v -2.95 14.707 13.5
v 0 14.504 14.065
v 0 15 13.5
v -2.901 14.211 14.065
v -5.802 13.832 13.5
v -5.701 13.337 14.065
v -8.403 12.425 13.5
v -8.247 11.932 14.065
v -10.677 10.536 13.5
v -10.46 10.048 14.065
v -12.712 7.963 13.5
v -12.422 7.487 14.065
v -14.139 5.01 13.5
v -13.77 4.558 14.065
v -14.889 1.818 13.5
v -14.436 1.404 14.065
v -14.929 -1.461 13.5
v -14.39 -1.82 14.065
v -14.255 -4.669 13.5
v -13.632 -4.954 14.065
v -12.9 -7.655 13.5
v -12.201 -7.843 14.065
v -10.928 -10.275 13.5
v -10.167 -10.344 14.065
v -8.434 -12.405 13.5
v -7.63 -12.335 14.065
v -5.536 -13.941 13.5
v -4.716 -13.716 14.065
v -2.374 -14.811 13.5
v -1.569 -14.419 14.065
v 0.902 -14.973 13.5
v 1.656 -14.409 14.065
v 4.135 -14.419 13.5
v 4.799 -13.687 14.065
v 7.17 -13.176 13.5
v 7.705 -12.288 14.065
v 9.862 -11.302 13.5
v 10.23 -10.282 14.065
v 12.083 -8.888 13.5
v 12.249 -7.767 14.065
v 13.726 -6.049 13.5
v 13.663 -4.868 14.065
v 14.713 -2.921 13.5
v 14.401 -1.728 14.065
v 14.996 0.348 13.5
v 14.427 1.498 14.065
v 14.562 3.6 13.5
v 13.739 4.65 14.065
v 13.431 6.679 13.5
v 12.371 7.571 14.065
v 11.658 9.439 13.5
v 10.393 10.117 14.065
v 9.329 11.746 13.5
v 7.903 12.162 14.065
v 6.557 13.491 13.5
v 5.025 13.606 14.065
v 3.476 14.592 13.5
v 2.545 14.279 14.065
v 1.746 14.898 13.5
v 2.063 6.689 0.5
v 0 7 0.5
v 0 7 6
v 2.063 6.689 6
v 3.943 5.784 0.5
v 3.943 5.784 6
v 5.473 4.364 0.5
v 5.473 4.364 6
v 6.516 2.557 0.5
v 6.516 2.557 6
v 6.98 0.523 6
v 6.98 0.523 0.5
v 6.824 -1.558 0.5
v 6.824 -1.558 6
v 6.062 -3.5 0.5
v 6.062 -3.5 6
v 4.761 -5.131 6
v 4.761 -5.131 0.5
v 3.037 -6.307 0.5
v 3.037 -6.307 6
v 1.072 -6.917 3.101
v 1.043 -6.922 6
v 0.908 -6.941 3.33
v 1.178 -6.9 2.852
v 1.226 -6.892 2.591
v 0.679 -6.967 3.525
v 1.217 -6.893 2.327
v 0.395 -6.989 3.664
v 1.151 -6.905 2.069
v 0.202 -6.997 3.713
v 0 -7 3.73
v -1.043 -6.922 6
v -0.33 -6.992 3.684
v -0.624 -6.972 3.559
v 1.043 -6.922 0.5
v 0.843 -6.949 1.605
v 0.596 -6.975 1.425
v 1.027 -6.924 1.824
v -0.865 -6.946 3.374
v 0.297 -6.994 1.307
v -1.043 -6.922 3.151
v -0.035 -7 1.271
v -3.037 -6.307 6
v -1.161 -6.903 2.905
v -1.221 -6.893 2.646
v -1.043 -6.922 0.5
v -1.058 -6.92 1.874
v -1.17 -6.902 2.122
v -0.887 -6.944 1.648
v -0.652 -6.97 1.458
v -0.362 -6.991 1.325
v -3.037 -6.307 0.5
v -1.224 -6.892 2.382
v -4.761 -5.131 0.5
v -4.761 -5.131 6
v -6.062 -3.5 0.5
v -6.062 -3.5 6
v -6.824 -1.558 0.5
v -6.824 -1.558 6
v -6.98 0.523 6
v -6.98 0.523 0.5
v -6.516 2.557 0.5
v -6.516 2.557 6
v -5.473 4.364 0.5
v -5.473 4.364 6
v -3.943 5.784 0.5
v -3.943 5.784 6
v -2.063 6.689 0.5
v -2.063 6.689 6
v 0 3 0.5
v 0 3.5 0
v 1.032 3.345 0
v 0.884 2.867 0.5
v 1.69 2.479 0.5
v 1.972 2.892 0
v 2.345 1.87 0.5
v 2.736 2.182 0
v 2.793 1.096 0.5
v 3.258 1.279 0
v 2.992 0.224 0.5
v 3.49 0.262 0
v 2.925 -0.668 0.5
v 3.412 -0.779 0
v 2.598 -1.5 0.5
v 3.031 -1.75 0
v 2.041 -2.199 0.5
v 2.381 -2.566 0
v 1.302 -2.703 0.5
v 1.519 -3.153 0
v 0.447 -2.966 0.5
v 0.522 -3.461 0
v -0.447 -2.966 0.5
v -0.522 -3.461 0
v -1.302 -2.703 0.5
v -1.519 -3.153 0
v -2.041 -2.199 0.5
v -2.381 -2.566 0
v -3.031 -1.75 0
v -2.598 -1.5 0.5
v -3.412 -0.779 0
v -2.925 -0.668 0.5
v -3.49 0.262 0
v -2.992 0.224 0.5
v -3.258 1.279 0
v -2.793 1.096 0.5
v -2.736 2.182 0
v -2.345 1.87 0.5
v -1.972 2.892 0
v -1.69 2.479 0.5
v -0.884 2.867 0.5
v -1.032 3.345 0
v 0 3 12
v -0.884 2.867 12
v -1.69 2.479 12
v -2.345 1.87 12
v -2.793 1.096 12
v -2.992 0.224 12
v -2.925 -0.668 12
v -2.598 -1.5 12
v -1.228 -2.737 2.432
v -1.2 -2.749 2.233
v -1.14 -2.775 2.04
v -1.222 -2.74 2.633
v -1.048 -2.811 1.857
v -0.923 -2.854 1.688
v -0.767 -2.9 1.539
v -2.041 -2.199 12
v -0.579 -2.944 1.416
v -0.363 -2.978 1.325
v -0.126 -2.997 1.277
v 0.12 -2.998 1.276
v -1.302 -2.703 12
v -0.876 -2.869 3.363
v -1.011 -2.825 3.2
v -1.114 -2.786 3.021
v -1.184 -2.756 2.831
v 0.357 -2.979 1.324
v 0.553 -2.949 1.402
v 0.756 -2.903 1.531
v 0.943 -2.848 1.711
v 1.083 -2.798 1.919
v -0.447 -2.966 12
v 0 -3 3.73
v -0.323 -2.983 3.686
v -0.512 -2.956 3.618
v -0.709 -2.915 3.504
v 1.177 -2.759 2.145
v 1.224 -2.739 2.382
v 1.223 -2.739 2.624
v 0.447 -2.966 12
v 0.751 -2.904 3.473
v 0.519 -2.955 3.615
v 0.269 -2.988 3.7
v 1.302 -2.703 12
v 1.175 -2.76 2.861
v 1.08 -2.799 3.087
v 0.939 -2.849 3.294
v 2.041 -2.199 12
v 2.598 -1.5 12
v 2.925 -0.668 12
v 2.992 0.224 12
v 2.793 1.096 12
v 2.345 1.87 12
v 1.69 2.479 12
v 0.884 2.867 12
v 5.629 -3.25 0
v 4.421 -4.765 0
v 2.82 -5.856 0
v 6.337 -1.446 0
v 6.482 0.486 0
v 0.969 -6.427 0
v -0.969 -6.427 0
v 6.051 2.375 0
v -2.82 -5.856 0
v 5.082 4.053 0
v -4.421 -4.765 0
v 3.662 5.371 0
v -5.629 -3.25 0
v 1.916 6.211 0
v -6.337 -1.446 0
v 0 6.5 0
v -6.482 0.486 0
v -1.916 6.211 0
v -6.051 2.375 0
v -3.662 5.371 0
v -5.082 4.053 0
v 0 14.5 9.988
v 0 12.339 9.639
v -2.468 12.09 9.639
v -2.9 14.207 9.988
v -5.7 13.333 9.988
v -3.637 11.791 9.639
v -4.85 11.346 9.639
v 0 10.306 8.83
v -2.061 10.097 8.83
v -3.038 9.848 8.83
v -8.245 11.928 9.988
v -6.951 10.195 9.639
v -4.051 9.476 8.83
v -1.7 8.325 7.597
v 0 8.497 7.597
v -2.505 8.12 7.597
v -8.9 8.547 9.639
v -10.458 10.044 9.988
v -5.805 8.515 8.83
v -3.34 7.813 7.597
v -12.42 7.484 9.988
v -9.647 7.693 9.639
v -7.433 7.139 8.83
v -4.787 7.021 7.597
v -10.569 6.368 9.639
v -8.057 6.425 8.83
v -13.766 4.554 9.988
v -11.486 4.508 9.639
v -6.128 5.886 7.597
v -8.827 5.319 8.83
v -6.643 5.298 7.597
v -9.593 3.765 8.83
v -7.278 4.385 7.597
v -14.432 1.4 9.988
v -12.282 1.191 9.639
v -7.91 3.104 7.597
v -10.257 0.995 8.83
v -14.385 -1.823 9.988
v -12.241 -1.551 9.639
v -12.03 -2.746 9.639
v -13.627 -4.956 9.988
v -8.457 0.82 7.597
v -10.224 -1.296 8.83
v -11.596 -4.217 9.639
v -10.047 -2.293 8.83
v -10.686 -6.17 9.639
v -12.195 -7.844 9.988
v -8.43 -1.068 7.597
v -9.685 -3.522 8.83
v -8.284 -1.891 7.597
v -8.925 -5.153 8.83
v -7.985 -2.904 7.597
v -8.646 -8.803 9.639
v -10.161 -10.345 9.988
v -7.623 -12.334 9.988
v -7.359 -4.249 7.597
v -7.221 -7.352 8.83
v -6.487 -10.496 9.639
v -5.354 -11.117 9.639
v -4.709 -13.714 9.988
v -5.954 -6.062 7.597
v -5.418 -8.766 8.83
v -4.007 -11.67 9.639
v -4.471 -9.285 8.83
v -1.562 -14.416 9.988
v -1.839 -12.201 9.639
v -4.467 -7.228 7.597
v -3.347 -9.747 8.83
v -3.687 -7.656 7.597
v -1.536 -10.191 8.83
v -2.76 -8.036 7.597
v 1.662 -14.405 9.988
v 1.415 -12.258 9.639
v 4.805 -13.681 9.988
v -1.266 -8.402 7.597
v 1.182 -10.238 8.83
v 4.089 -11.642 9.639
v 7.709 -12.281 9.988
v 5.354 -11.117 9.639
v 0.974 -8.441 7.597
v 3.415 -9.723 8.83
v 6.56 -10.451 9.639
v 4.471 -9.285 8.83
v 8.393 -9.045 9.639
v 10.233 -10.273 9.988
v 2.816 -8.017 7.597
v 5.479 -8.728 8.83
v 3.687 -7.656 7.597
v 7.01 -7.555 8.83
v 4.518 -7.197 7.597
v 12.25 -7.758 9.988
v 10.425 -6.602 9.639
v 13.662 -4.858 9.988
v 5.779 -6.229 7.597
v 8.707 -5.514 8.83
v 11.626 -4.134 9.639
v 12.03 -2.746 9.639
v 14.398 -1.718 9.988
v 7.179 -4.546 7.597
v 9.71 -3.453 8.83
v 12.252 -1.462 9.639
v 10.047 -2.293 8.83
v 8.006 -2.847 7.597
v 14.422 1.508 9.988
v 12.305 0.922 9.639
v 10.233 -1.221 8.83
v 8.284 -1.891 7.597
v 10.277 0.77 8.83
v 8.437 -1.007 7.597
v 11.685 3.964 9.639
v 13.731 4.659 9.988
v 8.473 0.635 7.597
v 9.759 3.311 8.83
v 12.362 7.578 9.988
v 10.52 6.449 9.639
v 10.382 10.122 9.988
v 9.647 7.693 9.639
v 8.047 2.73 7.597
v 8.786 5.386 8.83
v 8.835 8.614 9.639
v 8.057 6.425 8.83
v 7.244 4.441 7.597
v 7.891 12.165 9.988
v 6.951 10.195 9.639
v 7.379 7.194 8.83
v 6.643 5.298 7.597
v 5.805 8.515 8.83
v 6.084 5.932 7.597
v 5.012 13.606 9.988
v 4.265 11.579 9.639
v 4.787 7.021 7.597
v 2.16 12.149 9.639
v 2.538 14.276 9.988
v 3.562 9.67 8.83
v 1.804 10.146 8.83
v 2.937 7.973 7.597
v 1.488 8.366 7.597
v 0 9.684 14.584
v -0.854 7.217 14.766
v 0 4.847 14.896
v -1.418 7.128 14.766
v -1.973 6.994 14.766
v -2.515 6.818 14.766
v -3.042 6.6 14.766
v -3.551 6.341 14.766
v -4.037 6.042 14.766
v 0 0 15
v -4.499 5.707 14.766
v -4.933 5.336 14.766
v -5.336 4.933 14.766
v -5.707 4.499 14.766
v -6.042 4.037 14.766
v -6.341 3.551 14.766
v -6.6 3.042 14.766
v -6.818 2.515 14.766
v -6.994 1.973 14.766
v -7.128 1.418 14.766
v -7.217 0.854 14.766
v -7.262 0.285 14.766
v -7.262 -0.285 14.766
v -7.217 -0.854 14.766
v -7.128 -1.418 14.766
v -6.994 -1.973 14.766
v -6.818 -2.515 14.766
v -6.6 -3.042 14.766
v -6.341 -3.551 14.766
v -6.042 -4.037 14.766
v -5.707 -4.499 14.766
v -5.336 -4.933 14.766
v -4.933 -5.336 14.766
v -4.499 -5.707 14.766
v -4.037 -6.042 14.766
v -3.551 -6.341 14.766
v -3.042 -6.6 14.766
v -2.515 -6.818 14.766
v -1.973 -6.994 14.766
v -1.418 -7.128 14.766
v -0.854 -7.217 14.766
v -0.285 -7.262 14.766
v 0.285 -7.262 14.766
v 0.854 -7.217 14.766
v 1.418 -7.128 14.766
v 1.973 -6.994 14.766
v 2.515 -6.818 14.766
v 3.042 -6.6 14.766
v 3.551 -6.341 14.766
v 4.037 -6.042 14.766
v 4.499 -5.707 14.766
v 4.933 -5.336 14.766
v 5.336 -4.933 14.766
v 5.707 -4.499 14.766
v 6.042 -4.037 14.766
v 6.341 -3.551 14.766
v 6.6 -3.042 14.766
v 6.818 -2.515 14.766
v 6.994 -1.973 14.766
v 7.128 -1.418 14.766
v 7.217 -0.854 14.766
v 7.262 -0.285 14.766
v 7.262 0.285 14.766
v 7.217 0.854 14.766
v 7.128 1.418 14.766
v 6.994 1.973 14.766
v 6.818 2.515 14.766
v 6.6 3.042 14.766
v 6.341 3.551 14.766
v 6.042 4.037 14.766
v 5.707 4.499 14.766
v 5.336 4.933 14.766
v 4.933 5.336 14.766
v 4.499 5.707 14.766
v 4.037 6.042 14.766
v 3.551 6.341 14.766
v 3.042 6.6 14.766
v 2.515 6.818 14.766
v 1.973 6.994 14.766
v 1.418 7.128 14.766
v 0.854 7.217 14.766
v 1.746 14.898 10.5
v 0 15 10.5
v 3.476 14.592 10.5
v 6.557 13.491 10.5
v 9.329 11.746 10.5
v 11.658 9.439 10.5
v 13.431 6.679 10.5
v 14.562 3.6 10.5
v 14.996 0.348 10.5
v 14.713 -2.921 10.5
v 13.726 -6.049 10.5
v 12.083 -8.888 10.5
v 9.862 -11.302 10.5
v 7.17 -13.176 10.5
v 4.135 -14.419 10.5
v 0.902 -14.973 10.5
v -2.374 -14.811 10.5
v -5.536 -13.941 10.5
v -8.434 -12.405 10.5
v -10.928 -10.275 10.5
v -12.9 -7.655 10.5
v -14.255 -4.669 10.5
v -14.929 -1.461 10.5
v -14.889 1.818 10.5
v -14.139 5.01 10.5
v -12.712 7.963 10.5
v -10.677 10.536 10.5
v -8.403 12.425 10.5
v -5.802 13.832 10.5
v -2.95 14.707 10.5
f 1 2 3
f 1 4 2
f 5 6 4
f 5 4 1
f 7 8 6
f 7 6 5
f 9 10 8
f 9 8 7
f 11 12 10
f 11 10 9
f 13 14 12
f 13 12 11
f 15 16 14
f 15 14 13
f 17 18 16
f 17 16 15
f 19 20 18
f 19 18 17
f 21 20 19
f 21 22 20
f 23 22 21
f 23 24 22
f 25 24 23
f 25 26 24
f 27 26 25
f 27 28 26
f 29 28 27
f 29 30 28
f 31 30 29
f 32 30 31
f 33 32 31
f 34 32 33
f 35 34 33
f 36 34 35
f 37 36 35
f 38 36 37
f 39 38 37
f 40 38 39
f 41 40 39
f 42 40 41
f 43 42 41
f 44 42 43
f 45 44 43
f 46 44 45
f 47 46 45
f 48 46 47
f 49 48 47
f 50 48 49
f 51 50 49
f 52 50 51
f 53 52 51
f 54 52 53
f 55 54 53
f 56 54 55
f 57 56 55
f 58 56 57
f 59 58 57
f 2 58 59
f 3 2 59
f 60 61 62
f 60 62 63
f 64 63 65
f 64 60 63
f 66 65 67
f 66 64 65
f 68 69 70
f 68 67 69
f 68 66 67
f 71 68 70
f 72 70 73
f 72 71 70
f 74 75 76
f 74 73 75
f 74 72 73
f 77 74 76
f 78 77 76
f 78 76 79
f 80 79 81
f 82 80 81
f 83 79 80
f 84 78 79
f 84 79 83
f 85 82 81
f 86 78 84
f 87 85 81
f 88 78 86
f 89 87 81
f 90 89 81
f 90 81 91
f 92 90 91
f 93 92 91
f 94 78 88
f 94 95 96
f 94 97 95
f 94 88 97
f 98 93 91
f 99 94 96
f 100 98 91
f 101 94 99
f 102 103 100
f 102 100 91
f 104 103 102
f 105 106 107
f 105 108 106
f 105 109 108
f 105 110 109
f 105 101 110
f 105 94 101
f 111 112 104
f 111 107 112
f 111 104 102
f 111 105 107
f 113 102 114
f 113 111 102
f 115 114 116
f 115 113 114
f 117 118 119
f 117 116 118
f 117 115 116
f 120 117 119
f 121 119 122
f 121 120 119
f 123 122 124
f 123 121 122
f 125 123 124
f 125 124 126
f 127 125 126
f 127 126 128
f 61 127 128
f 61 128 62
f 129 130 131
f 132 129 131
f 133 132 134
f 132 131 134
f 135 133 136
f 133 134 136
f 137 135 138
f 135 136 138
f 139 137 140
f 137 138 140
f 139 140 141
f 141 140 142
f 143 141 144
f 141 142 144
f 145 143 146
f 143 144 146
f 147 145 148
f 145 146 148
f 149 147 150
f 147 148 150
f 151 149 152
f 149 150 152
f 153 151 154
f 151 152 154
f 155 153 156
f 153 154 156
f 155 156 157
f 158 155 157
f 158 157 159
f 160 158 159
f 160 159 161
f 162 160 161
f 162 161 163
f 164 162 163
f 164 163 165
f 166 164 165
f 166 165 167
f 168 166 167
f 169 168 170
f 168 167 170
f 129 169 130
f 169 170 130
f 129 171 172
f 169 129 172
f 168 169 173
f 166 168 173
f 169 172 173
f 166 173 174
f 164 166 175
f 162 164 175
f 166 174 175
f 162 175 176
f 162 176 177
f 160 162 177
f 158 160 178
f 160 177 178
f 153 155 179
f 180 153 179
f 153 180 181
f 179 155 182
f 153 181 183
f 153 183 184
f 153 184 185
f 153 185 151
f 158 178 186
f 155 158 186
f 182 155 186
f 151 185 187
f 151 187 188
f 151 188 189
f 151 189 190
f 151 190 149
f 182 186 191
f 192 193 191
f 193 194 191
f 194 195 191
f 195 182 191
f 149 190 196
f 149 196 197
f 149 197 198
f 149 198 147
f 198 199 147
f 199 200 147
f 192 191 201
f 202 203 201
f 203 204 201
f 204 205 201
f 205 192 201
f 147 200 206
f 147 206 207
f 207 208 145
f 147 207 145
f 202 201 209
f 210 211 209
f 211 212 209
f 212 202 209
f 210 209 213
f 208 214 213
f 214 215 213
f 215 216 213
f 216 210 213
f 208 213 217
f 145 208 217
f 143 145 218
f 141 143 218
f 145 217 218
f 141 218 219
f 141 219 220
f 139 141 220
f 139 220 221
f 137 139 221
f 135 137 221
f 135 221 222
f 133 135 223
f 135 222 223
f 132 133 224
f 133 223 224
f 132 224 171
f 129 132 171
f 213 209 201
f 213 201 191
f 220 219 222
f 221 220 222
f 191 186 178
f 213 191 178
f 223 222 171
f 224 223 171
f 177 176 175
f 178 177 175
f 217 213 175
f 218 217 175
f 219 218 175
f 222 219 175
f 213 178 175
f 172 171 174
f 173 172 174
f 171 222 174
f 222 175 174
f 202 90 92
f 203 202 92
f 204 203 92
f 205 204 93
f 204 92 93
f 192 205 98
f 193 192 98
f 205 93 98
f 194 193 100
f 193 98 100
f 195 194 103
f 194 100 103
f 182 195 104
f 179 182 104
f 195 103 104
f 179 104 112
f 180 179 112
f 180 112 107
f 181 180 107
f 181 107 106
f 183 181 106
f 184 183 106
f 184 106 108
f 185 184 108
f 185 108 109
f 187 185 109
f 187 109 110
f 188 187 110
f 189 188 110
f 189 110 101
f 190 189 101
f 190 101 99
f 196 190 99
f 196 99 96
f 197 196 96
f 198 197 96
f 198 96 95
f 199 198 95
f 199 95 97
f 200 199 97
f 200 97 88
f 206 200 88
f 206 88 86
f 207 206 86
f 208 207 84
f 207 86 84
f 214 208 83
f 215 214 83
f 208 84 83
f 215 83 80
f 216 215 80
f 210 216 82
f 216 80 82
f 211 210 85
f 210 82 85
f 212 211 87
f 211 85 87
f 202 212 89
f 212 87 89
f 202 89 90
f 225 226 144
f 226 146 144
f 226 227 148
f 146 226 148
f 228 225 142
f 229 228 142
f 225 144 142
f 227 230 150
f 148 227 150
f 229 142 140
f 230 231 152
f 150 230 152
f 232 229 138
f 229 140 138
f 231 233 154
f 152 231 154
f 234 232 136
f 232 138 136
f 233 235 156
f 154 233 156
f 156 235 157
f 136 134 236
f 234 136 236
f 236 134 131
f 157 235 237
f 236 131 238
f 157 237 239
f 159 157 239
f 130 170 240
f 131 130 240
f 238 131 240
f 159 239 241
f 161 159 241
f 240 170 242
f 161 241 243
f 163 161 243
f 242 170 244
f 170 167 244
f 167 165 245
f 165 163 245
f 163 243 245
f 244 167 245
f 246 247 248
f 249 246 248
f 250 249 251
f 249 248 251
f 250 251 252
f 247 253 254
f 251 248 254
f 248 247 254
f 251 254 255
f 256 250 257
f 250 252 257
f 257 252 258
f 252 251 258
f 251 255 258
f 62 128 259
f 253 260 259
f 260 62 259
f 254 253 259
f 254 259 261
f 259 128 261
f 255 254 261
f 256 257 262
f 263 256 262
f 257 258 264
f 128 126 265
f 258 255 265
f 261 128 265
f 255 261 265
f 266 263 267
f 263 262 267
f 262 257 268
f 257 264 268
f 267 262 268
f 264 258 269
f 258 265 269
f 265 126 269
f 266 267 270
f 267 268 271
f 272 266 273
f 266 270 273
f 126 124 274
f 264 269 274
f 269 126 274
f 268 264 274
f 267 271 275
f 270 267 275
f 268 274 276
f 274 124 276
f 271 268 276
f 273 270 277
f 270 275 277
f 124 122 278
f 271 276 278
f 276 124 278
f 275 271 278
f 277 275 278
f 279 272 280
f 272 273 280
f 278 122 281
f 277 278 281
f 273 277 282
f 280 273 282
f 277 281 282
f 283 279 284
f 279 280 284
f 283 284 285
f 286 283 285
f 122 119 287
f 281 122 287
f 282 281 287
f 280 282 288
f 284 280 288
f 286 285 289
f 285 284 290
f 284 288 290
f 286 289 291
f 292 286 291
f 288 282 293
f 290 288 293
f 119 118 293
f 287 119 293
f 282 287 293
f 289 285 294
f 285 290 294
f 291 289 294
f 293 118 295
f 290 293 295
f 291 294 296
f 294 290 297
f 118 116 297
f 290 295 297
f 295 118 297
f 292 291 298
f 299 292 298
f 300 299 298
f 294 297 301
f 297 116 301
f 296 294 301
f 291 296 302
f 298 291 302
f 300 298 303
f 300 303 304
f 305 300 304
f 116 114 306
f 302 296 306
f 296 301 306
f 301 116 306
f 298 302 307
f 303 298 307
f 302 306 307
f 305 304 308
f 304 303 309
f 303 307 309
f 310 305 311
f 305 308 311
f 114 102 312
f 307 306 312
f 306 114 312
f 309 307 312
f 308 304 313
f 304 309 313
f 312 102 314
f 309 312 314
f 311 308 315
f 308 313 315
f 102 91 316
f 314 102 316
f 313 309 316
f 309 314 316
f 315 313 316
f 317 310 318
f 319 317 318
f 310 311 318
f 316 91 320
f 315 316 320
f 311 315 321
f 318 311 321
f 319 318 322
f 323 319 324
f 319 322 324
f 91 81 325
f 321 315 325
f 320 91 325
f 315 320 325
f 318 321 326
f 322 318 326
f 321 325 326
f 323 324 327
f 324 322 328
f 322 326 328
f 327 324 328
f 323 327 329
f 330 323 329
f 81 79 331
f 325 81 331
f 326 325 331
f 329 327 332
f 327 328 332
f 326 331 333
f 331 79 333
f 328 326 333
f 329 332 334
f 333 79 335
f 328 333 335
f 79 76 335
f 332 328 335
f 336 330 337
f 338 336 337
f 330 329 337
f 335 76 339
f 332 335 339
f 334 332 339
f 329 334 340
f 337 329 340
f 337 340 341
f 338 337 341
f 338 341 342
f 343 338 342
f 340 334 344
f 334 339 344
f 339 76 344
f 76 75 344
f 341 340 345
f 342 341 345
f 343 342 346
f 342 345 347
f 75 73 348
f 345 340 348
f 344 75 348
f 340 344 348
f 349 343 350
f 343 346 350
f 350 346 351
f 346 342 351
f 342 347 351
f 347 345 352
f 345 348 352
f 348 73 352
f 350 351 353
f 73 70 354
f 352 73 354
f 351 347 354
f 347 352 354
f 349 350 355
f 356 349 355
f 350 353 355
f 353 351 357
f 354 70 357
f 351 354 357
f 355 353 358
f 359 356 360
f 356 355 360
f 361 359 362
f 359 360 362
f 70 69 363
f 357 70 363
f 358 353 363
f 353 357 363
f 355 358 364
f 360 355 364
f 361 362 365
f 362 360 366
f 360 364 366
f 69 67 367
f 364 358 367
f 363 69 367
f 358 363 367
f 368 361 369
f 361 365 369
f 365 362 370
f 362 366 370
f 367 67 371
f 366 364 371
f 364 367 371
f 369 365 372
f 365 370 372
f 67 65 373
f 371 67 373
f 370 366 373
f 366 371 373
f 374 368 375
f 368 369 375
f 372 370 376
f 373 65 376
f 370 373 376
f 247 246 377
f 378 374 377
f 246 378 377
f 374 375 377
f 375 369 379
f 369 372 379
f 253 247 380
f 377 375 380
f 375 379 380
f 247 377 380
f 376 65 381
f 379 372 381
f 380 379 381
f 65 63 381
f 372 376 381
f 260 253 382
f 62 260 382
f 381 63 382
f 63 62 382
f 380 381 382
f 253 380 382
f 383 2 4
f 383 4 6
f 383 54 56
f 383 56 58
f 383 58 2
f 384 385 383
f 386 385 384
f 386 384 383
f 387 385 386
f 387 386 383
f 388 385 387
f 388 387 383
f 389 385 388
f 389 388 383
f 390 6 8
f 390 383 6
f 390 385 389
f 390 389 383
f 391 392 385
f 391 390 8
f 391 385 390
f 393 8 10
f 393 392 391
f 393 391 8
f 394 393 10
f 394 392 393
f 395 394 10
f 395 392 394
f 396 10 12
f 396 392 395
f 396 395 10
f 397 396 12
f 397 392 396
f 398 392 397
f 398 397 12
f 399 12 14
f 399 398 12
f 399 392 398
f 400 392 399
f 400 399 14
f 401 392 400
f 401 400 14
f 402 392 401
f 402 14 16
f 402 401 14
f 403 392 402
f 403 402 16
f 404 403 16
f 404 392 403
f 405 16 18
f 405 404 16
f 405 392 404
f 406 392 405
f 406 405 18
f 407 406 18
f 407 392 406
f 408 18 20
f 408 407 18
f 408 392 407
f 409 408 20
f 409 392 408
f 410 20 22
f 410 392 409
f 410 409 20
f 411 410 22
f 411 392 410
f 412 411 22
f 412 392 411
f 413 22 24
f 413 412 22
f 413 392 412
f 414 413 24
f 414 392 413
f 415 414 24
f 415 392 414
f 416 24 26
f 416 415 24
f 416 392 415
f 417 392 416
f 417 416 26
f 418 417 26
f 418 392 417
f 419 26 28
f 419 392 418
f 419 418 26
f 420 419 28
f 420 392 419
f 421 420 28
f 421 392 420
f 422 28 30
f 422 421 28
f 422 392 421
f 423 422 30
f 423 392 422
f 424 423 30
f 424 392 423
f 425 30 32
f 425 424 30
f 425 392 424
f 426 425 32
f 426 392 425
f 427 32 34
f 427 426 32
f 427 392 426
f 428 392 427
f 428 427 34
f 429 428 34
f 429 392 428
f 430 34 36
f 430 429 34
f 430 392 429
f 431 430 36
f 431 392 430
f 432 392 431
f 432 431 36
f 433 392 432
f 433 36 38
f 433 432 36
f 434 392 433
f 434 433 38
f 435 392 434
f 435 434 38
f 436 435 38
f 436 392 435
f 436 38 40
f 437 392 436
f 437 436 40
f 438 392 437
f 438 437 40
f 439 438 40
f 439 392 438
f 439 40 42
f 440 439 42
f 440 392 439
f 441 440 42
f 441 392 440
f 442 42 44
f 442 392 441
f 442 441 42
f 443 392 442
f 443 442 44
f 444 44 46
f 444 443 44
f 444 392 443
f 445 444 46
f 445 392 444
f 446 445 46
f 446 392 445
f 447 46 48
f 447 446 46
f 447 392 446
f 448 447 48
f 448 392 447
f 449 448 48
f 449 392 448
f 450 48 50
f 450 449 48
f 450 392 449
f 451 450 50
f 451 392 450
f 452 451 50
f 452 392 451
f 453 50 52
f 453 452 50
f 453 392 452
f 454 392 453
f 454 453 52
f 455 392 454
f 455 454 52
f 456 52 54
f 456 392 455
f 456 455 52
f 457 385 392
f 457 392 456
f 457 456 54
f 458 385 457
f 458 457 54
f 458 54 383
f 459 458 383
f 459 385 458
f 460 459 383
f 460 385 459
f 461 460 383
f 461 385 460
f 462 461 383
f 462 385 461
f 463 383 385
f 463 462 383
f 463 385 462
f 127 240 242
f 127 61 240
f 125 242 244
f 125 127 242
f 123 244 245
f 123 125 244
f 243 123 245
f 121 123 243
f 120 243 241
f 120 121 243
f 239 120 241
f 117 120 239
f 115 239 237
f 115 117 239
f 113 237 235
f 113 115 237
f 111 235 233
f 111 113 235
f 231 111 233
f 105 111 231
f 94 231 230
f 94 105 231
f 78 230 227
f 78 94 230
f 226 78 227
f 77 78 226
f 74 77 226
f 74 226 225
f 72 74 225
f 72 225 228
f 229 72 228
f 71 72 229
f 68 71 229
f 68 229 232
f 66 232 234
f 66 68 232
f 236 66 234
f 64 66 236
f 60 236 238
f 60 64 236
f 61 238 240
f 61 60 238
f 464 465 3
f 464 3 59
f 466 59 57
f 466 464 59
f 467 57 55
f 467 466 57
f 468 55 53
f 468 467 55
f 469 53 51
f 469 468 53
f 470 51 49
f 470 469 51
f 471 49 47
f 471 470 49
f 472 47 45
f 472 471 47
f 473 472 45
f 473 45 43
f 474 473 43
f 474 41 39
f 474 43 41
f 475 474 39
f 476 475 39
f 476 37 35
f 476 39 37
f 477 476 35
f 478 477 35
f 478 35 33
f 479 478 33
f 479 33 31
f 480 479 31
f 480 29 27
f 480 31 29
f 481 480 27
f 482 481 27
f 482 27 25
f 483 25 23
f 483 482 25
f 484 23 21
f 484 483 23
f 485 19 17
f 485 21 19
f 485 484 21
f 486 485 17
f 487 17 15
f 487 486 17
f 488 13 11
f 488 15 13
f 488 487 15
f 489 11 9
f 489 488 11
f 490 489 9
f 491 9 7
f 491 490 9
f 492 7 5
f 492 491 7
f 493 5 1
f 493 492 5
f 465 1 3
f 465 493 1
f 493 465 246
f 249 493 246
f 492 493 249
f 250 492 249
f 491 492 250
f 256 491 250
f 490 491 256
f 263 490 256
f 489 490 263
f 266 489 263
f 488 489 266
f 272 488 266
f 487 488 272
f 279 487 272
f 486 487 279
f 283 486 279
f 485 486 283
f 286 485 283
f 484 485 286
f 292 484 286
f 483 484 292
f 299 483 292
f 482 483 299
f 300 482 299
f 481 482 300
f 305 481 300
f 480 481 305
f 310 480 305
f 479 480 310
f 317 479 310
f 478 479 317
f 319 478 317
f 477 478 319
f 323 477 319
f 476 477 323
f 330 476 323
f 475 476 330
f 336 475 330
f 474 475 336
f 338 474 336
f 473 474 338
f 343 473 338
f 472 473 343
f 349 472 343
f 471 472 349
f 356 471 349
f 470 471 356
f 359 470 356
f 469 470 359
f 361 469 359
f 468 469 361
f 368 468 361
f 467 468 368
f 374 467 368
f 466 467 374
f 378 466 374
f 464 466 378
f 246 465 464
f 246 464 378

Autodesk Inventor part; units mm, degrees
ref_plane "YZ Plane" through (0, 0, 0) normal (1, 0, 0) x (0, 1, 0)
ref_plane "XZ Plane" through (0, 0, 0) normal (0, 1, 0) x (-1, 0, 0)
ref_plane "XY Plane" through (0, 0, 0) normal (0, 0, 1) x (1, 0, 0)
sketch "Skizze1" plane through (0, 0, 0) normal (1, 0, 0) x (0, 1, 0)
  line L0 (0, 0) -> (0, 67.4576) construction
  line L1 (3, 0) -> (3, 12)
  line L2 (3, 12) -> (0, 12)
  line L3 (0, 12) -> (0, 15)
  line L4 (15, 14) -> (15, 10)
  line L5 (7, 6) -> (7, 0)
  line L6 (7, 0) -> (3, 0)
  arc A0 (15, 10) -> (7, 6) centre (15, 0) ccw
  line L7 (15, 10) -> (23.1737, 10) construction
  arc A1 (15, 14) -> (0, 15) centre (0, -98) ccw
  line L8 (0, 15) -> (-13.142, 15) construction
  dimension "d0" = 6
  dimension "d1" = 14
  dimension "d2" = 30
  dimension "d3" = 6
  dimension "d5" = 4
  dimension "d6" = 12
  dimension "d12" = 10
  dimension "d13" = 15
revolve "Umdrehung1" add sketch "Skizze1" angle 360 about axis through (0, 0, 0) along (0, 0, 1)
chamfer "Fase1" distance 0.5 angle 45 4 edges at (0, -7, 0) (0, -3, 0) (0, -15, 10) (0, -15, 14)
sketch "Skizze2" plane through (0, 0, 0) normal (0, 1, 0) x (-1, 0, 0)
  line L0 (6.5, 0) -> (-6.5, 0) projected
  point P0 (0, 0)
  point P1 (0, 2.5)
  point P2 (0, 0)
  dimension "d14" = 2.5
hole "Bohrung1" at (0, 0, 2.5) direction (0, -1, 0) diameter 2.459 end through all thread size "M3x0.5" class "6H" standard "ISO Metric profile"
properties part number "EW_Drehknopf" material "Messing, weicher Gelbton"
